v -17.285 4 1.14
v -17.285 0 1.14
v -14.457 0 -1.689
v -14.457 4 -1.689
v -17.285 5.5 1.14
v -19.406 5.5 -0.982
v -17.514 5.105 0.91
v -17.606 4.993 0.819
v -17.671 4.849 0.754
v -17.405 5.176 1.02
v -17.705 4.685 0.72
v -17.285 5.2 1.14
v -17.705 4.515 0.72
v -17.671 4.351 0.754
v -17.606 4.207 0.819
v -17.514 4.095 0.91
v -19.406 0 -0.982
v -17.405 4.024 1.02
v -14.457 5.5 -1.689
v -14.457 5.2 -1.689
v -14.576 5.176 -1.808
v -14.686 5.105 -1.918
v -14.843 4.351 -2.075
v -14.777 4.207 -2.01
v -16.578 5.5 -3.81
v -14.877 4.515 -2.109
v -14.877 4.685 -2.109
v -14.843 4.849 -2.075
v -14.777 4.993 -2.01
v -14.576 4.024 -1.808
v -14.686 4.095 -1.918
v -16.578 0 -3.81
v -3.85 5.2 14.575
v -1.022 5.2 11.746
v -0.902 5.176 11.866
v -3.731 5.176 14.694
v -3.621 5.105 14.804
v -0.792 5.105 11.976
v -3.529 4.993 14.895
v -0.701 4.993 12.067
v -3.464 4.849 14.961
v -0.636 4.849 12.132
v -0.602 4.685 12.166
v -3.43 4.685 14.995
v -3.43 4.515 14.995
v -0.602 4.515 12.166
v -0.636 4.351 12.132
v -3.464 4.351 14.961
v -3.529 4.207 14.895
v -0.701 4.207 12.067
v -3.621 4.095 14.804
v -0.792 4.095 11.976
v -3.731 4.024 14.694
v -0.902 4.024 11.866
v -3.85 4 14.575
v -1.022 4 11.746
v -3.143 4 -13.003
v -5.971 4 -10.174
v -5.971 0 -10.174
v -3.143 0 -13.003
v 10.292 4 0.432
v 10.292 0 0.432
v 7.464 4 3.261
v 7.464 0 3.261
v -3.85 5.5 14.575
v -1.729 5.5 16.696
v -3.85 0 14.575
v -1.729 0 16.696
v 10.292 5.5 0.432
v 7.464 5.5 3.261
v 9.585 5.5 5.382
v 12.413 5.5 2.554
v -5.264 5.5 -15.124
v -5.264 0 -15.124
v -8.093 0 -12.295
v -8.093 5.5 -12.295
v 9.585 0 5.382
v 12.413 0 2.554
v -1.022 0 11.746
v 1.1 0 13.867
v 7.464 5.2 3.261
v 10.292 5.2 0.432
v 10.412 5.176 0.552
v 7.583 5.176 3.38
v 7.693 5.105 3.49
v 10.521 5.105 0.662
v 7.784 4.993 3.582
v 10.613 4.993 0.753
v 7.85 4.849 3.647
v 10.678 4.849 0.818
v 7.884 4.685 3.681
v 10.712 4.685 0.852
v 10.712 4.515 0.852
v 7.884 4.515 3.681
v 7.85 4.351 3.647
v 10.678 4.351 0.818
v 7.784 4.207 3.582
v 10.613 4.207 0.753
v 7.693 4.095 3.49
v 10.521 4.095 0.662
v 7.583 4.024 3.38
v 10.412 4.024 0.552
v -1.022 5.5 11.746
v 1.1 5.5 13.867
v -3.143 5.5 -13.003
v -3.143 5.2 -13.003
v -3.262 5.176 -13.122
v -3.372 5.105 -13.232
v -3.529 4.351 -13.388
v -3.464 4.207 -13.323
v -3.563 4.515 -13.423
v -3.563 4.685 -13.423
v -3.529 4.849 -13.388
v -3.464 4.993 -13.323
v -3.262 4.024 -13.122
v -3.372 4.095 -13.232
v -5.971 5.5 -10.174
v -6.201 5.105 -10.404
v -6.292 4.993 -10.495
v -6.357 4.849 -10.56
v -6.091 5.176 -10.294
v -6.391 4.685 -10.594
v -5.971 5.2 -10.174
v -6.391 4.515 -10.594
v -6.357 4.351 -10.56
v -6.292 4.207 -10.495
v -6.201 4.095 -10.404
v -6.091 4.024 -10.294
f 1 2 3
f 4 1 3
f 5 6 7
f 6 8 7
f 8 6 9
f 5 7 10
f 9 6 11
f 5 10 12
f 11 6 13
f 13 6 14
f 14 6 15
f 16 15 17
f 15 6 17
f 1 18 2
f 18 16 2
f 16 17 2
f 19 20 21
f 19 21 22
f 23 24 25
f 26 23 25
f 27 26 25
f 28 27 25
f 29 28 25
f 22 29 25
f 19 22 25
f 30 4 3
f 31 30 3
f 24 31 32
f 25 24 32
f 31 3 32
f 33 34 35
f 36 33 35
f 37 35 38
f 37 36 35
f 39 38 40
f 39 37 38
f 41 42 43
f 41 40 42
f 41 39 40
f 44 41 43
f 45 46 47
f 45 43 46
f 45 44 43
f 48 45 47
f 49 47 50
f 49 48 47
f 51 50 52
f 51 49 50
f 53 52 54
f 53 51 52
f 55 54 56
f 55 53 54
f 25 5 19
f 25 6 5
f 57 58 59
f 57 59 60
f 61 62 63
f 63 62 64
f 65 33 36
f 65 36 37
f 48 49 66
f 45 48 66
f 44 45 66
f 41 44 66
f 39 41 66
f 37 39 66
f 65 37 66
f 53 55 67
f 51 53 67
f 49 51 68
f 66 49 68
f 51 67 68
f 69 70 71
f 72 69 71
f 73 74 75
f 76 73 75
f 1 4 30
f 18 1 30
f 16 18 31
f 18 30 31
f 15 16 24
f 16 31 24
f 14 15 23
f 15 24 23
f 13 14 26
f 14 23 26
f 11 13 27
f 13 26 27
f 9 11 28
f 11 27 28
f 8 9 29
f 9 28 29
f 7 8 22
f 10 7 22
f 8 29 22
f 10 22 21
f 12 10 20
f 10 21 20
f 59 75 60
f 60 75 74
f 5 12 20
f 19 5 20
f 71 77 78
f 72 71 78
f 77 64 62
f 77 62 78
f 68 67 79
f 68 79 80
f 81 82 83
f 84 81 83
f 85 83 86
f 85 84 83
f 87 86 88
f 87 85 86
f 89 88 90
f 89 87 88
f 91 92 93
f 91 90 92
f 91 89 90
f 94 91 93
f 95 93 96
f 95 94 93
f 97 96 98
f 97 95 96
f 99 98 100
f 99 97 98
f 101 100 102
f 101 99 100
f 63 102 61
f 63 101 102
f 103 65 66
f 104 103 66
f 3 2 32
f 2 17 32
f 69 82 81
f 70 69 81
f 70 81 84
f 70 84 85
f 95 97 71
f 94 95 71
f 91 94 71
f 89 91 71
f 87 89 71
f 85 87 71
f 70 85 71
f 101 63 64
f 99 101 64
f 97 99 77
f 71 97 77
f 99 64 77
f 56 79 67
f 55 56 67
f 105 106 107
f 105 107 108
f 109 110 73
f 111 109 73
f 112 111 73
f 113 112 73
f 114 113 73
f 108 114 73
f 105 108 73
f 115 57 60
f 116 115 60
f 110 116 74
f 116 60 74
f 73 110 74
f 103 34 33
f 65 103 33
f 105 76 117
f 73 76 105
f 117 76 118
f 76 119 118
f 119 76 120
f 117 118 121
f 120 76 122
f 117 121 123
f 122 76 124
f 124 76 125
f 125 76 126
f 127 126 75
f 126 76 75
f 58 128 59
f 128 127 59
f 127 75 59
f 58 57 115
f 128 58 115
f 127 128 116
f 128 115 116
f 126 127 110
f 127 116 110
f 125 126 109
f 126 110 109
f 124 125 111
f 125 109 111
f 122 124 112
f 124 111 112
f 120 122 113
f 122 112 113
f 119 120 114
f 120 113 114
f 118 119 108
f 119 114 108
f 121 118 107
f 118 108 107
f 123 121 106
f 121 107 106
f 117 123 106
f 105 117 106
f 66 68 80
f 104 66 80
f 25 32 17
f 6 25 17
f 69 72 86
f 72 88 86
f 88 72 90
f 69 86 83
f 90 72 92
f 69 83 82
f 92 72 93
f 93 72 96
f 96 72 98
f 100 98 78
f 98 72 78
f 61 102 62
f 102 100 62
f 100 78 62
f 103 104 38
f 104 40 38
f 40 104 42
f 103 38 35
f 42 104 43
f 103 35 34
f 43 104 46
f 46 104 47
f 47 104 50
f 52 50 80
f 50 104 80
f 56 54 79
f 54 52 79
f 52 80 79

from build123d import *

# Parameters (mm, degrees)
BOSS_EXTRUDE3_DEPTH     = 5.5
BOSS_EXTRUDE3_2_DEPTH   = 5.5
BOSS_EXTRUDE3_3_DEPTH   = 5.5
BOSS_EXTRUDE3_4_DEPTH   = 5.5
CUT_EXTRUDE2_DEPTH      = 34.017772808
CUT_EXTRUDE2_DEPTH_BACK = 34.017772808
CUT_EXTRUDE5_DEPTH      = 34.017772808


with BuildPart() as part:
    # Sketch5 → Boss-Extrude3 (new body)
    with BuildSketch(Plane(origin=(0, 0, 0), x_dir=(1, 0, 0), z_dir=(0, 1, 0))):
        Polygon((9.584998142, -5.382202346), (12.413425266, -2.553775221), (10.292104923, -0.432454878), (7.463677798, -3.260882003), align=None)
    extrude(amount=BOSS_EXTRUDE3_DEPTH)


with BuildPart() as body_2:
    # Sketch5 → Boss-Extrude3 2 (new body)
    with BuildSketch(Plane(origin=(0, 0, 0), x_dir=(1, 0, 0), z_dir=(0, 1, 0))):
        Polygon((-5.971351044, 10.17414684), (-3.14292392, 13.002573965), (-5.264244263, 15.123894308), (-8.092671388, 12.295467184), align=None)
    extrude(amount=BOSS_EXTRUDE3_2_DEPTH)


with BuildPart() as body_3:
    # Sketch5 → Boss-Extrude3 3 (new body)
    with BuildSketch(Plane(origin=(0, 0, 0), x_dir=(1, 0, 0), z_dir=(0, 1, 0))):
        Polygon((-17.285059543, -1.139561659), (-14.456632419, 1.688865466), (-16.577952762, 3.810185809), (-19.406379887, 0.981758685), align=None)
    extrude(amount=BOSS_EXTRUDE3_3_DEPTH)


with BuildPart() as body_4:
    # Sketch5 → Boss-Extrude3 4 (new body)
    with BuildSketch(Plane(origin=(0, 0, 0), x_dir=(1, 0, 0), z_dir=(0, 1, 0))):
        Polygon((-1.728710357, -16.695910845), (1.099716767, -13.86748372), (-1.021603576, -11.746163377), (-3.850030701, -14.574590502), align=None)
    extrude(amount=BOSS_EXTRUDE3_4_DEPTH)


with BuildPart() as cut_extrude2_tool:
    # Sketch6 → Cut-Extrude2 (new, two sides: drawn at the far end of the back side and taken through both)
    with BuildSketch(Plane(origin=(4.929825023, 0, -4.929825023), x_dir=(-0.7071067811865475, 0, -0.7071067811865477), z_dir=(0.7071067811865477, 0, -0.7071067811865475)).offset(-CUT_EXTRUDE2_DEPTH_BACK)):
        with BuildLine():
            Line((67.256085177, 5.2), (-7.58340896, 5.2))
            ThreePointArc((-7.58340896, 5.2), (-8.18340896, 4.6), (-7.58340896, 4))
            Line((-7.58340896, 4), (67.256085177, 4))
            Line((67.256085177, 4), (216.935073452, 4))
            Line((216.935073452, 4), (216.935073452, 5.2))
            Line((216.935073452, 5.2), (67.256085177, 5.2))
        make_face()
    extrude(amount=CUT_EXTRUDE2_DEPTH + CUT_EXTRUDE2_DEPTH_BACK)


with BuildPart() as body_4_1:
    add(body_4.part)

    # Cut-Extrude2: cut by cut_extrude2_tool
    add(cut_extrude2_tool.part, mode=Mode.SUBTRACT)


with BuildPart() as part_1:
    add(part.part)

    # Cut-Extrude2: cut by cut_extrude2_tool
    add(cut_extrude2_tool.part, mode=Mode.SUBTRACT)


with BuildPart() as cut_extrude5_tool:
    # Sketch7 → Cut-Extrude5 (new, through all)
    with BuildSketch(Plane(origin=(4.929825023, 0, -4.929825023), x_dir=(-0.7071067811865479, 0, -0.7071067811865472), z_dir=(0.7071067811865472, 0, -0.7071067811865479))):
        with BuildLine():
            Line((11.41659104, 5.2), (11.41659104, 4))
            ThreePointArc((11.41659104, 4), (12.01659104, 4.6), (11.41659104, 5.2))
        make_face()
    extrude(amount=-CUT_EXTRUDE5_DEPTH)


with BuildPart() as body_2_1:
    add(body_2.part)

    # Cut-Extrude5: cut by cut_extrude5_tool
    add(cut_extrude5_tool.part, mode=Mode.SUBTRACT)


with BuildPart() as body_3_1:
    add(body_3.part)

    # Cut-Extrude5: cut by cut_extrude5_tool
    add(cut_extrude5_tool.part, mode=Mode.SUBTRACT)


solid = Compound([body_4_1.part, part_1.part, body_2_1.part, body_3_1.part])
